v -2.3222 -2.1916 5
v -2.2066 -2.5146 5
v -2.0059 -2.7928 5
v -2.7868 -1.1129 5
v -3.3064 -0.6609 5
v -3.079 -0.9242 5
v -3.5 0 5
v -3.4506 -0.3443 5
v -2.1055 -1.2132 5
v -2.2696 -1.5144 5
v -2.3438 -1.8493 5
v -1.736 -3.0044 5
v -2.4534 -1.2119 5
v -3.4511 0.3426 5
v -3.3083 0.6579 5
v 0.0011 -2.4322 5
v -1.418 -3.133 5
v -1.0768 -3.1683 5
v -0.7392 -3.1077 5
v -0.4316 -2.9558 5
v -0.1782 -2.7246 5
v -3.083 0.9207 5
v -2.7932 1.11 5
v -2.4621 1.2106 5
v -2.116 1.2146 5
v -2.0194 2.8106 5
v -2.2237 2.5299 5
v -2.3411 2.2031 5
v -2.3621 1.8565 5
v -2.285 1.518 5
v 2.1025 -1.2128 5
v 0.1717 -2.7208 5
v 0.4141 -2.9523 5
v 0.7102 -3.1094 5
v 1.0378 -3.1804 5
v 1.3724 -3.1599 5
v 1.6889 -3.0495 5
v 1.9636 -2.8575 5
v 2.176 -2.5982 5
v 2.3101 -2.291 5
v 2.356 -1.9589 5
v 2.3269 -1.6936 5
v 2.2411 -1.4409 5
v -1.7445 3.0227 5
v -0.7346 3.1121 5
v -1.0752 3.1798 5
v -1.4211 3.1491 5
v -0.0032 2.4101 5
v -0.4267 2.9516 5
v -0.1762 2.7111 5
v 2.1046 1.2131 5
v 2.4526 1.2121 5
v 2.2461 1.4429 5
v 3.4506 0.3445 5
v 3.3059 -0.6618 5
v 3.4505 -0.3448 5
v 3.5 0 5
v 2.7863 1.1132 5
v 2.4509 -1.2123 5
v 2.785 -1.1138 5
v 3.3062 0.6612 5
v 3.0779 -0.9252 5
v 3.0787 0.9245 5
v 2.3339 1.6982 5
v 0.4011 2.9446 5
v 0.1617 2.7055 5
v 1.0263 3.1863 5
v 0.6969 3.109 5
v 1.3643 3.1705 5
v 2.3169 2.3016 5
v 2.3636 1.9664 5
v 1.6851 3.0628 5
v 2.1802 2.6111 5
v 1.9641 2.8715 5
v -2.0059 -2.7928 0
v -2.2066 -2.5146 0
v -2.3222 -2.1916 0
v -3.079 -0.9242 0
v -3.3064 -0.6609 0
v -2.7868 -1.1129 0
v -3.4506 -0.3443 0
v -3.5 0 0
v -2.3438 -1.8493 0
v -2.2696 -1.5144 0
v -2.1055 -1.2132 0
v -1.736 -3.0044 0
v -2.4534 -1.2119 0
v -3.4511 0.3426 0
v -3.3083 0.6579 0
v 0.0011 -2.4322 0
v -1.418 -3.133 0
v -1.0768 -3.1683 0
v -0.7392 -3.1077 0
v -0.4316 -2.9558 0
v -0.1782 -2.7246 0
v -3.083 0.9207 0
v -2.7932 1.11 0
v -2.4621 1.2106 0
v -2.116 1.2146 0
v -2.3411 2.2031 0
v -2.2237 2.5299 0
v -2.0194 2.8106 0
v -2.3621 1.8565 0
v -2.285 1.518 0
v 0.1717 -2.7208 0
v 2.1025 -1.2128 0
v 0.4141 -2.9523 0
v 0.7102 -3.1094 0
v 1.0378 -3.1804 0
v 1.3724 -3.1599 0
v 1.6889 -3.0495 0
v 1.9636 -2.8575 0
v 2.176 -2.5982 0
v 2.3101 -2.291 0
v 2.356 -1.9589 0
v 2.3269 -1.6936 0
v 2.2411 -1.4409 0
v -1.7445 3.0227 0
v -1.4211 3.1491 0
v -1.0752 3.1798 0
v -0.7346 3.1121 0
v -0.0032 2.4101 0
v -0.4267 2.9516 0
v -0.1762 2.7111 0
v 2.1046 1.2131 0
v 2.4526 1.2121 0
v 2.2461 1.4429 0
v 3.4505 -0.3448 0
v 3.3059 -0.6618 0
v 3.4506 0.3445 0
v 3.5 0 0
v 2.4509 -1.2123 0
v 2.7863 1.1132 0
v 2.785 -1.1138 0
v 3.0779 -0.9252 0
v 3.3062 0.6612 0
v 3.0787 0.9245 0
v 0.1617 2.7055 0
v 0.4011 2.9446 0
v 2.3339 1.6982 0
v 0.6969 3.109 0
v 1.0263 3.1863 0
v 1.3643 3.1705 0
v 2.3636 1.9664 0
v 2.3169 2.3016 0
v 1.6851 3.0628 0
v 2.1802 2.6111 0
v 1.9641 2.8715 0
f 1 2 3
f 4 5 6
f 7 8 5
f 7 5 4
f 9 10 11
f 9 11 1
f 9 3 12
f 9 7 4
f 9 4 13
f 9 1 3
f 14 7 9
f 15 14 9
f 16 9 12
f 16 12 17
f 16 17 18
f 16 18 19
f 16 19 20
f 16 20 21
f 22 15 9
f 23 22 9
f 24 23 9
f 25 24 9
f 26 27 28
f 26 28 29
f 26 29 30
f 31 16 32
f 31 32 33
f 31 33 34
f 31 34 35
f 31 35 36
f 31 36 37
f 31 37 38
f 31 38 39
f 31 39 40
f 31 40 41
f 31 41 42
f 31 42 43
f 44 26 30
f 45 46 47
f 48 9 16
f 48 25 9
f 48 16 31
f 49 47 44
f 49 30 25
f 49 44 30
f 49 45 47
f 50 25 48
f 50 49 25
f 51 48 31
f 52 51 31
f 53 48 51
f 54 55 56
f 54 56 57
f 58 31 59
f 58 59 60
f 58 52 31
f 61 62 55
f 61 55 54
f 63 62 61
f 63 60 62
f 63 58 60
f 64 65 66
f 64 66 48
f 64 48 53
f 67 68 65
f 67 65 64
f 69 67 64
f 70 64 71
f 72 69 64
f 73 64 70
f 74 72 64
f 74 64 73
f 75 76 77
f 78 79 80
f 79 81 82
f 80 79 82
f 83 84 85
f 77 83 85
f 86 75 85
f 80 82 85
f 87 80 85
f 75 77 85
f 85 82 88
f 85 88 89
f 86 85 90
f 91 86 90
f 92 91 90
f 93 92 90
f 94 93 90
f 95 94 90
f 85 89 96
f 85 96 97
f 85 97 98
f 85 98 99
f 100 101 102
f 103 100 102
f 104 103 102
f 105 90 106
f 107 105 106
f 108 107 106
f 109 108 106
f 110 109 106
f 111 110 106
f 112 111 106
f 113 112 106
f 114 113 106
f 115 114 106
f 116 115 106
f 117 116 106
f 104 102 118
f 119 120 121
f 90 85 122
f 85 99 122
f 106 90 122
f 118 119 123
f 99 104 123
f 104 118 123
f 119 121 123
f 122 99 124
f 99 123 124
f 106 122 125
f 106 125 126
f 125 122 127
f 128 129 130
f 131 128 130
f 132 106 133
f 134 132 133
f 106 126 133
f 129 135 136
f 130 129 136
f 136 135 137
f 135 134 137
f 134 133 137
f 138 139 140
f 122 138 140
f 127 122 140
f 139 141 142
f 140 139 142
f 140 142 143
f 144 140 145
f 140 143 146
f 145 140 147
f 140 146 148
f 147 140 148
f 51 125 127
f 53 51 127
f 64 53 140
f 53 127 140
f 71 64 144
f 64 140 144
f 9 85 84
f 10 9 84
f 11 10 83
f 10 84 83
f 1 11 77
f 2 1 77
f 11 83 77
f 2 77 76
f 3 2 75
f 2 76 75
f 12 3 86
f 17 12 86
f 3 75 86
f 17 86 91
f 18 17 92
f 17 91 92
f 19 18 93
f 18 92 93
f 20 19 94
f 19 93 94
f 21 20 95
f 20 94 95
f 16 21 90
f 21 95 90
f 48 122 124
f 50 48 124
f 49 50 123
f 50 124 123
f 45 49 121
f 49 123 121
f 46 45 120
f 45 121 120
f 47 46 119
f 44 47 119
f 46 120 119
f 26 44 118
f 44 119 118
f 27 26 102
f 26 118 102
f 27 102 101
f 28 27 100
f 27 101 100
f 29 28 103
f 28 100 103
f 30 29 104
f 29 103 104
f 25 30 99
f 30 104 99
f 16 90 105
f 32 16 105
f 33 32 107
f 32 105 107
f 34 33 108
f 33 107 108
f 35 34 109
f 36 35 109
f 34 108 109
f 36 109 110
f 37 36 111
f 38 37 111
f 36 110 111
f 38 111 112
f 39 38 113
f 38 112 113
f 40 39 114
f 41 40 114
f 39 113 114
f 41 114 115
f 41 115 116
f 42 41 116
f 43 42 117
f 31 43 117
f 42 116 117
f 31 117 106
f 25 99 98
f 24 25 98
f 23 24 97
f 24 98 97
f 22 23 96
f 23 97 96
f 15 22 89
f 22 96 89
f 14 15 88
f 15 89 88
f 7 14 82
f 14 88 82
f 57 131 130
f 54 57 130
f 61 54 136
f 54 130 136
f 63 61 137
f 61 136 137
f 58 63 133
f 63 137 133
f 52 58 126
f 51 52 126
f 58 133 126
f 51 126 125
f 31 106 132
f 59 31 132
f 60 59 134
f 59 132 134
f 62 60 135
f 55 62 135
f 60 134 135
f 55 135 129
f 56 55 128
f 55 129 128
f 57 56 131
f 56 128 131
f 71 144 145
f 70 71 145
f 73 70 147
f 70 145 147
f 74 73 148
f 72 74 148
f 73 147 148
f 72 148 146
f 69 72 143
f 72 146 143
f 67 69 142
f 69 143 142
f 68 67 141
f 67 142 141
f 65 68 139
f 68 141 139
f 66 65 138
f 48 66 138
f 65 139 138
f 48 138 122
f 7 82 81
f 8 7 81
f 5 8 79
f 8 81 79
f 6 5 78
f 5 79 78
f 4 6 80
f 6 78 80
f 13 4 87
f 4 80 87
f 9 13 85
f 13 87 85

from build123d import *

# Parameters (mm, degrees)
F1_DEPTH = 5


with BuildPart() as f1:
    # F0 (on Top) → F1 (new body)
    with BuildSketch(Plane.XY):
        with BuildLine():
            ThreePointArc((-0.0032454835, 2.4100617583), (-1.7444594295, 3.0227098771), (-2.115982294, 1.2146350766))
            ThreePointArc((-2.115982294, 1.2146350766), (-1.660800532, 1.0598981147), (-1.3002209241, 0.7419102056))
            ThreePointArc((-1.3002209241, 0.7419102056), (-0.5166175034, 0.9027342531), (0.0006491683, 1.5129259324))
            ThreePointArc((0.0006491683, 1.5129259324), (-0.0863815539, 1.9611244808), (-0.0032454835, 2.4100617583))
        make_face()
        with BuildLine():
            ThreePointArc((-2.115982294, 1.2146350766), (-3.083031036, 0.9207121401), (-3.5, 0))
            ThreePointArc((-3.5, 0), (-3.0790448546, -0.9241952563), (-2.1054908215, -1.213215413))
            ThreePointArc((-2.1054908215, -1.213215413), (-1.7471466082, -0.8904039187), (-1.2919668901, -0.7309383728))
            ThreePointArc((-1.2919668901, -0.7309383728), (-1.1120639399, -0.3849736616), (-1.05, 0))
            ThreePointArc((-1.05, 0), (-1.1142396096, 0.3914847583), (-1.3002209241, 0.7419102056))
            ThreePointArc((-1.3002209241, 0.7419102056), (-1.7554026862, 0.8966471675), (-2.115982294, 1.2146350766))
        make_face()
        with BuildLine():
            ThreePointArc((-1.3002209241, 0.7419102056), (-1.660800532, 1.0598981147), (-2.115982294, 1.2146350766))
            ThreePointArc((-2.115982294, 1.2146350766), (-1.7554026862, 0.8966471675), (-1.3002209241, 0.7419102056))
        make_face()
        with BuildLine():
            ThreePointArc((-1.2919668901, -0.7309383728), (-1.7471466082, -0.8904039187), (-2.1054908215, -1.213215413))
            ThreePointArc((-2.1054908215, -1.213215413), (-1.6503111034, -1.0537498671), (-1.2919668901, -0.7309383728))
        make_face()
        with BuildLine():
            ThreePointArc((-1.2919668901, -0.7309383728), (-1.6503111034, -1.0537498671), (-2.1054908215, -1.213215413))
            ThreePointArc((-2.1054908215, -1.213215413), (-1.7359979287, -3.0044336554), (0.0011148123, -2.4322211823))
            ThreePointArc((0.0011148123, -2.4322211823), (-0.0939762845, -1.9509044509), (0.0074248045, -1.4708774395))
            ThreePointArc((0.0074248045, -1.4708774395), (-0.5162756494, -0.8796500011), (-1.2919668901, -0.7309383728))
        make_face()
        with BuildLine():
            ThreePointArc((2.3559973284, -1.958944836), (2.2909030568, -1.5649350629), (2.1025382242, -1.212799215))
            ThreePointArc((2.1025382242, -1.212799215), (1.6572404008, -1.0578270547), (1.3034591042, -0.746145621))
            ThreePointArc((1.3034591042, -0.746145621), (0.5331160977, -0.8897568104), (0.0074248045, -1.4708774395))
            ThreePointArc((0.0074248045, -1.4708774395), (0.0785275261, -1.702783823), (0.1025422884, -1.9441537858))
            ThreePointArc((0.1025422884, -1.9441537858), (0.0769174053, -2.1934013116), (0.0011148123, -2.4322211823))
            ThreePointArc((0.0011148123, -2.4322211823), (1.3723672911, -3.1599300737), (2.3559973284, -1.958944836))
        make_face()
        with BuildLine():
            ThreePointArc((2.1025382242, -1.212799215), (3.0779194619, -0.9251731393), (3.5, 0))
            ThreePointArc((3.5, 0), (3.0786929463, 0.9245012969), (2.1045671053, 1.2130859938))
            ThreePointArc((2.1045671053, 1.2130859938), (1.7515384972, 0.905810587), (1.3090397977, 0.7533564147))
            ThreePointArc((1.3090397977, 0.7533564147), (1.0500084837, 0.0045590483), (1.3034591042, -0.746145621))
            ThreePointArc((1.3034591042, -0.746145621), (1.7487569276, -0.9011177813), (2.1025382242, -1.212799215))
        make_face()
        with BuildLine():
            ThreePointArc((1.3090397977, 0.7533564147), (1.6620684058, 1.0606318215), (2.1045671053, 1.2130859938))
            ThreePointArc((2.1045671053, 1.2130859938), (2.2970382233, 1.5681185753), (2.363606903, 1.9664424086))
            ThreePointArc((2.363606903, 1.9664424086), (1.3642790397, 3.170476082), (-0.0032454835, 2.4100617583))
            ThreePointArc((-0.0032454835, 2.4100617583), (0.0618394297, 2.1874422019), (0.0837967819, 1.9565452822))
            ThreePointArc((0.0837967819, 1.9565452822), (0.0628304553, 1.7308731455), (0.0006491683, 1.5129259324))
            ThreePointArc((0.0006491683, 1.5129259324), (0.5235763818, 0.9070263156), (1.3090397977, 0.7533564147))
        make_face()
        with BuildLine():
            ThreePointArc((0.0837967819, 1.9565452822), (0.0618394297, 2.1874422019), (-0.0032454835, 2.4100617583))
            ThreePointArc((-0.0032454835, 2.4100617583), (-0.0863815539, 1.9611244808), (0.0006491683, 1.5129259324))
            ThreePointArc((0.0006491683, 1.5129259324), (0.0628304553, 1.7308731455), (0.0837967819, 1.9565452822))
        make_face()
        with BuildLine():
            ThreePointArc((1.3090397977, 0.7533564147), (1.7515384972, 0.905810587), (2.1045671053, 1.2130859938))
            ThreePointArc((2.1045671053, 1.2130859938), (1.6620684058, 1.0606318215), (1.3090397977, 0.7533564147))
        make_face()
        with BuildLine():
            ThreePointArc((1.3034591042, -0.746145621), (1.6572404008, -1.0578270547), (2.1025382242, -1.212799215))
            ThreePointArc((2.1025382242, -1.212799215), (1.7487569276, -0.9011177813), (1.3034591042, -0.746145621))
        make_face()
        with BuildLine():
            ThreePointArc((0.0074248045, -1.4708774395), (-0.0939762845, -1.9509044509), (0.0011148123, -2.4322211823))
            ThreePointArc((0.0011148123, -2.4322211823), (0.0769174053, -2.1934013116), (0.1025422884, -1.9441537858))
            ThreePointArc((0.1025422884, -1.9441537858), (0.0785275261, -1.702783823), (0.0074248045, -1.4708774395))
        make_face()
        with BuildLine():
            ThreePointArc((1.3034591042, -0.746145621), (1.0500084837, 0.0045590483), (1.3090397977, 0.7533564147))
            ThreePointArc((1.3090397977, 0.7533564147), (0.5235763818, 0.9070263156), (0.0006491683, 1.5129259324))
            ThreePointArc((0.0006491683, 1.5129259324), (-0.5166175034, 0.9027342531), (-1.3002209241, 0.7419102056))
            ThreePointArc((-1.3002209241, 0.7419102056), (-1.1142396096, 0.3914847583), (-1.05, 0))
            ThreePointArc((-1.05, 0), (-1.1120639399, -0.3849736616), (-1.2919668901, -0.7309383728))
            ThreePointArc((-1.2919668901, -0.7309383728), (-0.5162756494, -0.8796500011), (0.0074248045, -1.4708774395))
            ThreePointArc((0.0074248045, -1.4708774395), (0.5331160977, -0.8897568104), (1.3034591042, -0.746145621))
        make_face()
    extrude(amount=F1_DEPTH)


solid = f1.part
